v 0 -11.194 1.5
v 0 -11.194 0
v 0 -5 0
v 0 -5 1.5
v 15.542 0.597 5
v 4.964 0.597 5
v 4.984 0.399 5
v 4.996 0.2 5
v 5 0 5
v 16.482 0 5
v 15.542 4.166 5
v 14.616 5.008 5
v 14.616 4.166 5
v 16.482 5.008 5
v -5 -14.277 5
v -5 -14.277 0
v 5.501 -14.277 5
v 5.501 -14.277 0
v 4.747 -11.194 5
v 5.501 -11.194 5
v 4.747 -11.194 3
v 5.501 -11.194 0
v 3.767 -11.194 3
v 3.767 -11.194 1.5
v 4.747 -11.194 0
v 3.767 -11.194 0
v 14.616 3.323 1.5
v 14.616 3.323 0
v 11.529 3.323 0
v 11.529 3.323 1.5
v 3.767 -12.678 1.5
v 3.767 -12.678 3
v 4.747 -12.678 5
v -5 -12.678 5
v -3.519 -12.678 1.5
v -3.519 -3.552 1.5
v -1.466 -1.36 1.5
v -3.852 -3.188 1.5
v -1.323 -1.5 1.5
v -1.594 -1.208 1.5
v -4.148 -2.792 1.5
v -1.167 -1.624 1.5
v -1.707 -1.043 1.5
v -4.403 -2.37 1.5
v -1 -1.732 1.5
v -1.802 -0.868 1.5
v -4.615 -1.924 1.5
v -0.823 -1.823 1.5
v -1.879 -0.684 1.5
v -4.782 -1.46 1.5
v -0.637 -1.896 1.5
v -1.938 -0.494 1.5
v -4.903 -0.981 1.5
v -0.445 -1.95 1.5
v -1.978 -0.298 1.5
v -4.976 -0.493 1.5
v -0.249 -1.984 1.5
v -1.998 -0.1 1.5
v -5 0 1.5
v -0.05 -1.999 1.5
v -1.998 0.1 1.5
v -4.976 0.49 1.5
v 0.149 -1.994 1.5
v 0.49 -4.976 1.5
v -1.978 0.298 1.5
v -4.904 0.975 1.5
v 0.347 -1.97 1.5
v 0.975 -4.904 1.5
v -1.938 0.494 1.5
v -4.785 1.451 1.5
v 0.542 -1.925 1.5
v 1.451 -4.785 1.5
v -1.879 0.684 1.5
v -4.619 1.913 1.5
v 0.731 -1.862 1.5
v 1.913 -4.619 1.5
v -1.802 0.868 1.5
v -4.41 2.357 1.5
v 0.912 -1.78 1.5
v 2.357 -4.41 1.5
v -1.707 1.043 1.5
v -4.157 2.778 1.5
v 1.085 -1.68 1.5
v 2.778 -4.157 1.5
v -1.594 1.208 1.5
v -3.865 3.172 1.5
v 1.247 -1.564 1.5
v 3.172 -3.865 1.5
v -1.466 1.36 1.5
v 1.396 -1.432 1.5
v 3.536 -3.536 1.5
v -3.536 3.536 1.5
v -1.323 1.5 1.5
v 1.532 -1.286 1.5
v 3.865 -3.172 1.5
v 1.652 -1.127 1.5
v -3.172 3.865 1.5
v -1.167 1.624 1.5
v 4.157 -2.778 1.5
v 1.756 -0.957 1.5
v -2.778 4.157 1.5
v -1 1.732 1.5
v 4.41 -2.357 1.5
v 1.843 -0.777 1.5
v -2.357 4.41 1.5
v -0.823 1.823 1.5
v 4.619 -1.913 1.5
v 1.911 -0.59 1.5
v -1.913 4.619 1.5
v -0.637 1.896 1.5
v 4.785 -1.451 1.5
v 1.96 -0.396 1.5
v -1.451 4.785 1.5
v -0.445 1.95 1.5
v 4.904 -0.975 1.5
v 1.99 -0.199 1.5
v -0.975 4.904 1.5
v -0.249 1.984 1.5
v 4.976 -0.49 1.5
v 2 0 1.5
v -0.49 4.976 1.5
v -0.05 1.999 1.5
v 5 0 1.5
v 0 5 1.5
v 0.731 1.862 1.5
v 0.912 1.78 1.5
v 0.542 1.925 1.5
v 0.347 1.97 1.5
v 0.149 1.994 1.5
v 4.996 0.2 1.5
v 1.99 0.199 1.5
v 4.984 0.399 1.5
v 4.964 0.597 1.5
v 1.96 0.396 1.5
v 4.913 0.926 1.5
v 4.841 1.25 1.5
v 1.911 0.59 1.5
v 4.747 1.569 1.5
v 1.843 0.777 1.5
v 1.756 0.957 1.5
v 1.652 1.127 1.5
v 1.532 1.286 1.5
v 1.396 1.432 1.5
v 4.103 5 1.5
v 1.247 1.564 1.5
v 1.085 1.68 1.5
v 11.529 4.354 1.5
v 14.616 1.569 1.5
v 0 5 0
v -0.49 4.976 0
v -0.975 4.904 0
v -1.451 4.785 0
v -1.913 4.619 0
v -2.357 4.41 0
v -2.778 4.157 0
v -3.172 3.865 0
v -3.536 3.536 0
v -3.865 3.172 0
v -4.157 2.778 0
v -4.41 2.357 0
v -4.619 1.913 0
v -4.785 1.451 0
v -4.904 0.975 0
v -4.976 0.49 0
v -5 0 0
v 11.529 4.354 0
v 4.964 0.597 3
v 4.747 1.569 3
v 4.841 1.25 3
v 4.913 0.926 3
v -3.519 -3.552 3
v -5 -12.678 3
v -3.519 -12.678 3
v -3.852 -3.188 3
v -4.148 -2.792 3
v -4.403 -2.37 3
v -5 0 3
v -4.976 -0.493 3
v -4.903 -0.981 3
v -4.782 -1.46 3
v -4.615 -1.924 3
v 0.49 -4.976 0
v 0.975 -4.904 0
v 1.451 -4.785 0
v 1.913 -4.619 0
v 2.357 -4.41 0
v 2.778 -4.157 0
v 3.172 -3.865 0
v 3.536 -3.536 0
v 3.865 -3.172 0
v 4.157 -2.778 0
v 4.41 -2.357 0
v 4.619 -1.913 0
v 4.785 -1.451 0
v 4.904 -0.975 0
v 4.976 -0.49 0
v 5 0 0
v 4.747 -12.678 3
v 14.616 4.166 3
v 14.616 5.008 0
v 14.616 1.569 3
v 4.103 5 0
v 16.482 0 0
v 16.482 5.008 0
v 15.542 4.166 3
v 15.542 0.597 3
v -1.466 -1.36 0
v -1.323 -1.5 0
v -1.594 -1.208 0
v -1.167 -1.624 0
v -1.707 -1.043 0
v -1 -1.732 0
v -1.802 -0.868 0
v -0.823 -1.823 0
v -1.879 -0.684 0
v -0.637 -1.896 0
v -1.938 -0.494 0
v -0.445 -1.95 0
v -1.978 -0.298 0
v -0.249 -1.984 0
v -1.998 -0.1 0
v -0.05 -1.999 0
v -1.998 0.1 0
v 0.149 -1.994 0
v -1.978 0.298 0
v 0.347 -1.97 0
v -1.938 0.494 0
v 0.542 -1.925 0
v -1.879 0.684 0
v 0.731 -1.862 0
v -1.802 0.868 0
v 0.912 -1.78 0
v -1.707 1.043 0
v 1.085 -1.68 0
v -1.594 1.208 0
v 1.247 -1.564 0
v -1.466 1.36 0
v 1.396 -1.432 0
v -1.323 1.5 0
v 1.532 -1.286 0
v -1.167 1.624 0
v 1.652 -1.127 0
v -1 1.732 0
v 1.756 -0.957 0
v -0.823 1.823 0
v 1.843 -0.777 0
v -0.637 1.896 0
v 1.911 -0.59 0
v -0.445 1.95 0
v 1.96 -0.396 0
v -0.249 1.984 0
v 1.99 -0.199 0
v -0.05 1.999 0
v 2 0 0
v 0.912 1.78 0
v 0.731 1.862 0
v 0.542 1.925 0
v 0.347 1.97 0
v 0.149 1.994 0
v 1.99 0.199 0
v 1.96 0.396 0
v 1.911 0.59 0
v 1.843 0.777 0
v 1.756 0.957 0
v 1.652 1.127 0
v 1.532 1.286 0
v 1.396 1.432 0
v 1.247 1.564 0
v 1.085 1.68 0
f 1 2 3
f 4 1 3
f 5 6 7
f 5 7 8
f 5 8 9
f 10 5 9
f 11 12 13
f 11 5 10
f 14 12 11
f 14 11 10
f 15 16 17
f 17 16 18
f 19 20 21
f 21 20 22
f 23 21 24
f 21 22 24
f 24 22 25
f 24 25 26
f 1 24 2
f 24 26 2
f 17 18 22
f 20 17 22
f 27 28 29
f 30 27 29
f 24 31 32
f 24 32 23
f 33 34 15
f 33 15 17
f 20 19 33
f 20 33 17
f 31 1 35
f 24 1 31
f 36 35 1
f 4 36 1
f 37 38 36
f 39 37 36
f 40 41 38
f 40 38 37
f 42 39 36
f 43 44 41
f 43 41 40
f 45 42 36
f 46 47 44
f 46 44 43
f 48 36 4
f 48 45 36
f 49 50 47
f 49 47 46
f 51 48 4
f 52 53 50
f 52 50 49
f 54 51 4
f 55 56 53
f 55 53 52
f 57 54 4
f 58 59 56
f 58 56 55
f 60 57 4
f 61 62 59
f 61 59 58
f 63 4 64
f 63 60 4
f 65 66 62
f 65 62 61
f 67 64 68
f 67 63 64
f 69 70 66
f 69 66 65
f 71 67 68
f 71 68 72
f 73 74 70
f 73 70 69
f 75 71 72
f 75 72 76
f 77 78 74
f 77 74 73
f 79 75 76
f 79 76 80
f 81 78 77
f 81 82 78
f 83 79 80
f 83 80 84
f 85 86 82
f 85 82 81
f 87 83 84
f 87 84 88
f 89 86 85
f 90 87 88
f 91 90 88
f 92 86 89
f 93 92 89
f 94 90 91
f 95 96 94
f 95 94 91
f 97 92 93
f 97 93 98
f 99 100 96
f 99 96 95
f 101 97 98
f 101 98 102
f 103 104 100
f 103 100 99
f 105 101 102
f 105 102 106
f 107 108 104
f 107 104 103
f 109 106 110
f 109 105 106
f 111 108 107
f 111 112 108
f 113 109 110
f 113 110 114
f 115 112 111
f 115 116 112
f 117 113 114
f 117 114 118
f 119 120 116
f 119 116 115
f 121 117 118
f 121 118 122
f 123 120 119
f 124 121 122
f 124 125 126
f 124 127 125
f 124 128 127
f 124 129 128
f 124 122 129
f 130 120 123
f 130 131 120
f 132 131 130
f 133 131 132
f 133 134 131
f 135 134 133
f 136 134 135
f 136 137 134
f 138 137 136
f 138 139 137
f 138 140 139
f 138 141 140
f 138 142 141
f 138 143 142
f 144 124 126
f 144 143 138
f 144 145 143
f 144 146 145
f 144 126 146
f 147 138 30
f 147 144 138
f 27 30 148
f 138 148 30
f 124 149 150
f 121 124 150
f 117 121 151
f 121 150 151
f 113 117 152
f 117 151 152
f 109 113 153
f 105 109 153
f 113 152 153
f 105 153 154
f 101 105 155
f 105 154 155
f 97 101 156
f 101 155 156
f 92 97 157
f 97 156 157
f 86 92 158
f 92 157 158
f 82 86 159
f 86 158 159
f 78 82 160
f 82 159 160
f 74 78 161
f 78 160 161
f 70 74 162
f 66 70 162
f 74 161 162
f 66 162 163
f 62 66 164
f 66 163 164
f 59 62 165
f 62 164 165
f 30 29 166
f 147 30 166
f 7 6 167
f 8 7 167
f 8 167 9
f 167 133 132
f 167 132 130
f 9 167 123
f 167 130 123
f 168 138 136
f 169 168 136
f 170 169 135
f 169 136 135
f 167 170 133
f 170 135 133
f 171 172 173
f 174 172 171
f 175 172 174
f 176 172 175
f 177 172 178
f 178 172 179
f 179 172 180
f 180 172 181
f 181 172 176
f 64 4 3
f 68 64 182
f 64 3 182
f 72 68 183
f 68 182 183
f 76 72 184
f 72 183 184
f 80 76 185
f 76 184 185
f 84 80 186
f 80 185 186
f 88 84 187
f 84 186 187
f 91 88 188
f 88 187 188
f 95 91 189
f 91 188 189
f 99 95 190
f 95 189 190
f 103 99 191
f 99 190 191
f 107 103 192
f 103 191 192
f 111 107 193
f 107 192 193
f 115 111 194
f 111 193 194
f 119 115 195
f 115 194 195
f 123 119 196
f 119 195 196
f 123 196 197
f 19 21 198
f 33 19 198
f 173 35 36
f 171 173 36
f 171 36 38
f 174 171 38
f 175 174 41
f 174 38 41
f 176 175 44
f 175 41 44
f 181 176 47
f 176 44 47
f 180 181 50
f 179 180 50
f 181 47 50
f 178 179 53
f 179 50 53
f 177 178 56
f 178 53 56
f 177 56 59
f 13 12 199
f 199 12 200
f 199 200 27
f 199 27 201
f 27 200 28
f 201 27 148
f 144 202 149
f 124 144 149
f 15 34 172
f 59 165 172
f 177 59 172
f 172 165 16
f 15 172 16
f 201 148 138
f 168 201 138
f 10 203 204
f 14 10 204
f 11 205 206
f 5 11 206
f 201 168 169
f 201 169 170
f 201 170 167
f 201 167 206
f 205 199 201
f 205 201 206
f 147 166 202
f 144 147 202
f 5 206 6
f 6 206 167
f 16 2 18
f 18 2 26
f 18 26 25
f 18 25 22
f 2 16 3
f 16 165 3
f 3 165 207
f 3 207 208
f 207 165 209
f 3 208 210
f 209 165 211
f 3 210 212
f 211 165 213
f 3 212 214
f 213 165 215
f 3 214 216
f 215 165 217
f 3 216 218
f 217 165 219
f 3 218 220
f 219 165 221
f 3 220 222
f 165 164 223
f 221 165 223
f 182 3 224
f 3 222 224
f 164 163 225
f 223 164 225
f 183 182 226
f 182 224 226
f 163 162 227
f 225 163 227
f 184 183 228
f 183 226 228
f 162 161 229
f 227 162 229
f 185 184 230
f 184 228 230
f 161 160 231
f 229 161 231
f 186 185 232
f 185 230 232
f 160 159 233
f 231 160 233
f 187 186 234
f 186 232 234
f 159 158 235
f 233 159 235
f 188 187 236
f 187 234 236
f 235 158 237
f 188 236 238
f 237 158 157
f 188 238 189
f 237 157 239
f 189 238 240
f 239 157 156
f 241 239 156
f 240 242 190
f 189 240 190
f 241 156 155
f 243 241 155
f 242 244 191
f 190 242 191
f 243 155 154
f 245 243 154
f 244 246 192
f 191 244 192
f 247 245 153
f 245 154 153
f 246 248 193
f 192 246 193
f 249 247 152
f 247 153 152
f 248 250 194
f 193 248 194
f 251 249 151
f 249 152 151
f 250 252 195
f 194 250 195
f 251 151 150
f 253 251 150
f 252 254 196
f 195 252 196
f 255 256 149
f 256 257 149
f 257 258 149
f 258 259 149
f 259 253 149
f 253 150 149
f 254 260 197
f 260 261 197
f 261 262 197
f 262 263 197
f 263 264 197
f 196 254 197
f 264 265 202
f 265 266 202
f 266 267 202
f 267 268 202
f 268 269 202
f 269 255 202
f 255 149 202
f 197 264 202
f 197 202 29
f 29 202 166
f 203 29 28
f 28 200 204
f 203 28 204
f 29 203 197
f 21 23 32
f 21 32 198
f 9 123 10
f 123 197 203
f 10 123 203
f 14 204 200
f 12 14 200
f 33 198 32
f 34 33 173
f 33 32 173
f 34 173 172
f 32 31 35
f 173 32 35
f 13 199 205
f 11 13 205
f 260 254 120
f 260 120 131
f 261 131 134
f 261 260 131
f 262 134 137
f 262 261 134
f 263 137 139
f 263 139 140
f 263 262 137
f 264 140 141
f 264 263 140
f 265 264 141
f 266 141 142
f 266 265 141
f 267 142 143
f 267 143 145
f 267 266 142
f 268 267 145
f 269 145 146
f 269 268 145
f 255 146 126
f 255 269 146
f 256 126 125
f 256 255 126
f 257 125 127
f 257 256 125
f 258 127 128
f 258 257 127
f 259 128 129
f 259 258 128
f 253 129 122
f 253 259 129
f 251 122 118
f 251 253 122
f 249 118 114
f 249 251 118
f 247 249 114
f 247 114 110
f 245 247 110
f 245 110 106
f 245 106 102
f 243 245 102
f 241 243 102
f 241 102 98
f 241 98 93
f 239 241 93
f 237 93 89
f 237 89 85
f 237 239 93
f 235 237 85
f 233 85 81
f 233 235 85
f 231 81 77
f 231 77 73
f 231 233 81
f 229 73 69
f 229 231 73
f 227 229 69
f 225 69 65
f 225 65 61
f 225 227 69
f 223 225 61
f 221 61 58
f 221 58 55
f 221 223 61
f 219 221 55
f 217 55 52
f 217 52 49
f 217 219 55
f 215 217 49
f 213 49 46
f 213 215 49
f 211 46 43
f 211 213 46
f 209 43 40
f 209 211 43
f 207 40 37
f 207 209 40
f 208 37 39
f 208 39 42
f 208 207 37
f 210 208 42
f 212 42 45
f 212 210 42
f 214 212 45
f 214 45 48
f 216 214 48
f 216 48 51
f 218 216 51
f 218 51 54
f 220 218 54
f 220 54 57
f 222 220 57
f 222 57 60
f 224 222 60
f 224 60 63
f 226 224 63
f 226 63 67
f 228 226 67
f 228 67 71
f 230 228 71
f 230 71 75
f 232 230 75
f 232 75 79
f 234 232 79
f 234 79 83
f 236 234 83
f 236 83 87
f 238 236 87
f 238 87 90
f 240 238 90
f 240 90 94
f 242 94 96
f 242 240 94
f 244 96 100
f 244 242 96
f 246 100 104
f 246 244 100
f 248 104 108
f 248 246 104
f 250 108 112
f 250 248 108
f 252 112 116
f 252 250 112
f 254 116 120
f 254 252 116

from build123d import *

# Parameters (mm, degrees)
SKETCH_1_R      = 2
EXTRUDE_1_DEPTH = 1.5
SKETCH_1_3_W    = 0.979922275
SKETCH_1_3_H    = 1.483986981
EXTRUDE_2_DEPTH = 3
EXTRUDE_3_DEPTH = 5


with BuildPart() as part:
    # 스케치1 → 보스-돌출1 (new body)
    with BuildSketch(Plane.XY):
        with BuildLine():
            Line((4.103232797, 5), (0, 5))
            ThreePointArc((0, 5), (-4.623797936, 1.902759219), (-3.51918966, -3.551802942))
            Line((-3.51918966, -3.551802942), (-3.51918966, -12.678202106))
            Line((-3.51918966, -12.678202106), (3.767394394, -12.678202106))
            Line((3.767394394, -12.678202106), (3.767394394, -11.194215125))
            Line((3.767394394, -11.194215125), (0, -11.194215125))
            Line((0, -11.194215125), (0, -5))
            ThreePointArc((0, -5), (4.052588627, -2.928570542), (4.747316669, 1.569389833))
            Line((4.747316669, 1.569389833), (14.616295983, 1.569389833))
            Line((14.616295983, 1.569389833), (14.616295983, 3.323351723))
            Line((14.616295983, 3.323351723), (11.529062921, 3.323351723))
            Line((11.529062921, 3.323351723), (11.529062921, 4.354010329))
            Line((11.529062921, 4.354010329), (4.103232797, 5))
        make_face()
        Circle(SKETCH_1_R, mode=Mode.SUBTRACT)
    extrude(amount=EXTRUDE_1_DEPTH)

    # 스케치1<3> → 보스-돌출2 (add)
    with BuildSketch(Plane.XY):
        with BuildLine():
            Line((14.616295983, 1.569389833), (4.747316669, 1.569389833))
            ThreePointArc((4.747316669, 1.569389833), (4.880000714, 1.088849406), (4.964172837, 0.597484763))
            Line((4.964172837, 0.597484763), (15.542189383, 0.597484763))
            Line((15.542189383, 0.597484763), (15.542189383, 4.165774783))
            Line((15.542189383, 4.165774783), (14.616295983, 4.165774783))
            Line((14.616295983, 4.165774783), (14.616295983, 1.569389833))
        make_face()
        with BuildLine():
            ThreePointArc((-3.51918966, -3.551802942), (-4.614972822, -1.924064929), (-5, 0))
            Line((-5, 0), (-5, -12.678202106))
            Line((-5, -12.678202106), (-3.51918966, -12.678202106))
            Line((-3.51918966, -12.678202106), (-3.51918966, -3.551802942))
        make_face()
        with Locations((4.257355532, -11.936208616)):
            Rectangle(SKETCH_1_3_W, SKETCH_1_3_H)
    extrude(amount=EXTRUDE_2_DEPTH)

    # 스케치1<4> → 보스-돌출3 (add)
    with BuildSketch(Plane.XY):
        with BuildLine():
            Line((15.542189383, 0.597484763), (4.964172837, 0.597484763))
            ThreePointArc((4.964172837, 0.597484763), (4.991035173, 0.299278978), (5, 0))
            Line((5, 0), (16.481935348, 0))
            Line((16.481935348, 0), (16.481935348, 5.008197844))
            Line((16.481935348, 5.008197844), (14.616295983, 5.008197844))
            Line((14.616295983, 5.008197844), (14.616295983, 4.165774783))
            Line((14.616295983, 4.165774783), (15.542189383, 4.165774783))
            Line((15.542189383, 4.165774783), (15.542189383, 0.597484763))
        make_face()
        Polygon((4.747316669, -12.678202106), (-5, -12.678202106), (-5, -14.27668016), (5.501186974, -14.27668016), (5.501186974, -11.194215125), (4.747316669, -11.194215125), align=None)
    extrude(amount=EXTRUDE_3_DEPTH)


solid = part.part
